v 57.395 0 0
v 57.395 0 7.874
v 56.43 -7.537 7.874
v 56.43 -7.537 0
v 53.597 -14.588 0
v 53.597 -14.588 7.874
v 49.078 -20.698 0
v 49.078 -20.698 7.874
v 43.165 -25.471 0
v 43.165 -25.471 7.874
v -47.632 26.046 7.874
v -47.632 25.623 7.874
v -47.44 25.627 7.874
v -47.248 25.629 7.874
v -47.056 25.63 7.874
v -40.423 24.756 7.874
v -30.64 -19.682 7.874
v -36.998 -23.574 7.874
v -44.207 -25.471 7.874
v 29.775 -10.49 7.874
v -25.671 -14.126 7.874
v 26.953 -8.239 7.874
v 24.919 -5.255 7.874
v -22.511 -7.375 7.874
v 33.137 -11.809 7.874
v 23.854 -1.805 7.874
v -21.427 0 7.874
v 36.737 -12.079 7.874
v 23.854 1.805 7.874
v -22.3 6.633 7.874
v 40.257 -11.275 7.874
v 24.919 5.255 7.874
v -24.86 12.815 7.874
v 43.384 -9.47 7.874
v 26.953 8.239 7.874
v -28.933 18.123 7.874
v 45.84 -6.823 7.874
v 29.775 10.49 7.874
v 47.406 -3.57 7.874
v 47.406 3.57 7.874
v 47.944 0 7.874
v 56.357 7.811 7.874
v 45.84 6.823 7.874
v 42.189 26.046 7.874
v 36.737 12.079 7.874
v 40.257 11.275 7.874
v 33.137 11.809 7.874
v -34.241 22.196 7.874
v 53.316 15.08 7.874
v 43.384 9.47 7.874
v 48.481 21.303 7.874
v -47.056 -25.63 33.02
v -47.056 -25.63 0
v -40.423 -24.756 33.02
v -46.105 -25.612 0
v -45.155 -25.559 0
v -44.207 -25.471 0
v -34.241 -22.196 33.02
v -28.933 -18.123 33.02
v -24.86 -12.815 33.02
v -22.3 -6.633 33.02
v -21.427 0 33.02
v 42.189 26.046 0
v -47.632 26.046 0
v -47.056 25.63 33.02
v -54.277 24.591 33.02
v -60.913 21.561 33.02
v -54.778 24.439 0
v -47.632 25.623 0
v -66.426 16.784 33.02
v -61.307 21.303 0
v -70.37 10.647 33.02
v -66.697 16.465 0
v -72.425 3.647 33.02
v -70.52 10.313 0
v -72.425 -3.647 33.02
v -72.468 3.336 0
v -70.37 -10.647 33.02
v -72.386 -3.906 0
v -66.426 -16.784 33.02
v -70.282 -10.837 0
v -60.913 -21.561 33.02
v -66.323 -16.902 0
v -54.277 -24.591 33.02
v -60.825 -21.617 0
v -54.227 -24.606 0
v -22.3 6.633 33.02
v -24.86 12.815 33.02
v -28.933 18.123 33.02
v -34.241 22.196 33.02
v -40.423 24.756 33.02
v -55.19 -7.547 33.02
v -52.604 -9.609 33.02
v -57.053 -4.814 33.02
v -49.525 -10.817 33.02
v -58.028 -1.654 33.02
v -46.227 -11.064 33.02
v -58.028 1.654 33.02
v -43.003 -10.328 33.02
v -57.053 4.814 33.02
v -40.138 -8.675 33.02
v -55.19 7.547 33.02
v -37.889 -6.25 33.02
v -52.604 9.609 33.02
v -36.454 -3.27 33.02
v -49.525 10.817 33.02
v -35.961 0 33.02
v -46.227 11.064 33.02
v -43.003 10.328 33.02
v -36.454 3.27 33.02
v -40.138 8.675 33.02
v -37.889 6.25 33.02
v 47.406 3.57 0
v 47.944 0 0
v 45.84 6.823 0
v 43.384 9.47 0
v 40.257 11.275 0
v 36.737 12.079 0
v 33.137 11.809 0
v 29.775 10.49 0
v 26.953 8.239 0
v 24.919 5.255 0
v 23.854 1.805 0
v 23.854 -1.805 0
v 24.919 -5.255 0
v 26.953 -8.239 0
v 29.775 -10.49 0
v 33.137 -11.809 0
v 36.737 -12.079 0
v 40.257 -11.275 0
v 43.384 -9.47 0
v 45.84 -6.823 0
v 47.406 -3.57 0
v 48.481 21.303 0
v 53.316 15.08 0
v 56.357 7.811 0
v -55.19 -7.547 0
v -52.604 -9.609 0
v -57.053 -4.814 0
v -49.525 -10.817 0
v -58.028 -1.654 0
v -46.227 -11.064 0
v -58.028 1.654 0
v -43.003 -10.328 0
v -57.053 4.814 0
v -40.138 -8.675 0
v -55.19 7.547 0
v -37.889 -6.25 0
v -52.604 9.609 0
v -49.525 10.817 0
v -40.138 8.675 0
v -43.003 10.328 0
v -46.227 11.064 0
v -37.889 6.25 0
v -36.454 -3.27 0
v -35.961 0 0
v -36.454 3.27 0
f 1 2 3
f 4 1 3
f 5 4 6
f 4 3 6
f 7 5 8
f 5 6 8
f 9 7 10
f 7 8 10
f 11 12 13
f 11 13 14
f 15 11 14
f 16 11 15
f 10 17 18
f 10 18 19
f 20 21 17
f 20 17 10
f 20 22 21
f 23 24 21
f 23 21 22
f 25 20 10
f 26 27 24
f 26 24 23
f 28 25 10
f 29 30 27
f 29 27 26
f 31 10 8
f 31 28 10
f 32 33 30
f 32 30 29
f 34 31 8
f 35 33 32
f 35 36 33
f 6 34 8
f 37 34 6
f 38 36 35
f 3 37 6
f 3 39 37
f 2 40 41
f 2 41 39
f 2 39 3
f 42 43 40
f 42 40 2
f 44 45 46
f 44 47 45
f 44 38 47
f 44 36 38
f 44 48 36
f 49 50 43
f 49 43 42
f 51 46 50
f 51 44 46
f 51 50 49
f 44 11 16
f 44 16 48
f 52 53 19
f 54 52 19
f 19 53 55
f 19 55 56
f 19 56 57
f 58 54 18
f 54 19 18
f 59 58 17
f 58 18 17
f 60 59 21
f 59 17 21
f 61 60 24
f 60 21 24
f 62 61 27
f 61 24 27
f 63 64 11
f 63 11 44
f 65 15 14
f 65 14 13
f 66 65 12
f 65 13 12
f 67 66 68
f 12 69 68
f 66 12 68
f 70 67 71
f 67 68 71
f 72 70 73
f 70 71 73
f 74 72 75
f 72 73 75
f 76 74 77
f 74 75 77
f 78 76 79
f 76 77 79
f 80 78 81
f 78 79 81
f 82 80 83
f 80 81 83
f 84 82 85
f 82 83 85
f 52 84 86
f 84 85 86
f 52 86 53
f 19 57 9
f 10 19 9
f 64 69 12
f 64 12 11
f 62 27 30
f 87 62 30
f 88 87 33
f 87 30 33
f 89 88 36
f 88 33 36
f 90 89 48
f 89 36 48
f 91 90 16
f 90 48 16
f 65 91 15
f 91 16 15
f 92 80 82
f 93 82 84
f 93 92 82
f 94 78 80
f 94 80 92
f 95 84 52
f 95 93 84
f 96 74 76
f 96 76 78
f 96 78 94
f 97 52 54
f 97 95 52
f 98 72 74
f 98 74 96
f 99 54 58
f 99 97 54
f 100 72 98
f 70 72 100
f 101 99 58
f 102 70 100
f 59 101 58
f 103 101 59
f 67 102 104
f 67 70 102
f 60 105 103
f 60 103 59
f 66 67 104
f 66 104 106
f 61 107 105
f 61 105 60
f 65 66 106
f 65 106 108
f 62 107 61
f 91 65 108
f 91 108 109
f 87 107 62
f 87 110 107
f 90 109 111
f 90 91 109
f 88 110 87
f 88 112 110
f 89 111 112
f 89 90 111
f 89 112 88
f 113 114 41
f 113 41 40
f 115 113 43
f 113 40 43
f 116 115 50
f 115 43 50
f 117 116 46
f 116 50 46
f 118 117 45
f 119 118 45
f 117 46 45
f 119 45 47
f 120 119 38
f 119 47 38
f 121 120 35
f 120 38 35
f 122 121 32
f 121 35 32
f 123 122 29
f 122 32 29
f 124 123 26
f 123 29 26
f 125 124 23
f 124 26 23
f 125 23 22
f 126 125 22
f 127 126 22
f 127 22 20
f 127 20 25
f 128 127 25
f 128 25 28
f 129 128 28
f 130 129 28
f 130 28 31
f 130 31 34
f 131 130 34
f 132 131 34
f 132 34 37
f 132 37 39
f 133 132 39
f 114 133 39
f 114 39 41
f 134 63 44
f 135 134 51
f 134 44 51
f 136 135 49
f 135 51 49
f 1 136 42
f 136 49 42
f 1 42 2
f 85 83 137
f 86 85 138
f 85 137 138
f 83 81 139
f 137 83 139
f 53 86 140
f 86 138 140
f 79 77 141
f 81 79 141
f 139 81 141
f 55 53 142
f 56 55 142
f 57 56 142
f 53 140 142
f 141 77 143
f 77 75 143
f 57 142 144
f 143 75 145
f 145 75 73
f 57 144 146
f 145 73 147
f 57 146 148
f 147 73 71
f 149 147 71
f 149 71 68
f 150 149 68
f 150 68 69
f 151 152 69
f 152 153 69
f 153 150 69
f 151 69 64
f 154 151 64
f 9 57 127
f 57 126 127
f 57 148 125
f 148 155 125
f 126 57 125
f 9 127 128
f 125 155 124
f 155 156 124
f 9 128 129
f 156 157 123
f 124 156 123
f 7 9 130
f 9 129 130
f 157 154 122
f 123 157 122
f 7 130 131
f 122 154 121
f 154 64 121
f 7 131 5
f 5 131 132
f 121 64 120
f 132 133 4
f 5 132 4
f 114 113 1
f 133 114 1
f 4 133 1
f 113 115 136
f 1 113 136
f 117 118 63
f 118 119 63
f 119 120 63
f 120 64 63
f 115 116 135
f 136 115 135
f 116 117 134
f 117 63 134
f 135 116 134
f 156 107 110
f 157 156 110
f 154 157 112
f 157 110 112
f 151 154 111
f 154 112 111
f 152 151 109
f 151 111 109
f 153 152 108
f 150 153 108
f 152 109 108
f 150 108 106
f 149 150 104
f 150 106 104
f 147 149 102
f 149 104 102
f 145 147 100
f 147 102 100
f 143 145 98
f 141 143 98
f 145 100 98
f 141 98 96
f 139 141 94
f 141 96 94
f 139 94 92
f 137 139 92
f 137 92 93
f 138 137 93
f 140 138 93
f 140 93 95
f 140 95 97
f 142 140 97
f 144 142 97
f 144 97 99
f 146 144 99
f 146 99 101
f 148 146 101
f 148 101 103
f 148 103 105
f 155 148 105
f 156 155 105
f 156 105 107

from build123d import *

# Parameters (mm, degrees)
F1_DEPTH = 33.02
F2_W     = 107.3515489697
F2_H     = 51.5172313899
F3_DEPTH = 7.874
F5_R     = 11.0954635734
F4_R     = 12.1126546704
F6_DEPTH = 81.534
F8_DEPTH = 25.4


with BuildPart() as f1:
    # F0 (on Top) → F1 (new body)
    with BuildSketch(Plane.XY):
        with BuildLine():
            ThreePointArc((-47.0562428236, -25.6296646715), (-28.9333331349, -18.1229096887), (-21.4265781521, 0))
            ThreePointArc((-21.4265781521, 0), (-28.9333331349, 18.1229096887), (-47.0562428236, 25.6296646715))
            ThreePointArc((-47.0562428236, 25.6296646715), (-72.6859074951, 0), (-47.0562428236, -25.6296646715))
        make_face()
    extrude(amount=F1_DEPTH)

    # F2 (on Top) → F3 (join)
    with BuildSketch(Plane.XY):
        with Locations((6.0439221561, 0.2878056839)):
            Rectangle(F2_W, F2_H)
    extrude(amount=F3_DEPTH)

    # F5 (on face) + F4 (on face) → F6 (cut)
    with BuildSketch(Plane.XY.offset(33.02)):
        with Locations((-47.0562428236, 0)):
            Circle(F5_R)
    with BuildSketch(Plane.XY.offset(7.874)):
        with Locations((35.8318202198, 0)):
            Circle(F4_R)
    extrude(amount=-F6_DEPTH, mode=Mode.SUBTRACT)

    # F7 (on face) → F8 (cut)
    with BuildSketch(Plane.XY.offset(7.874)):
        with BuildLine():
            ThreePointArc((42.1889192994, 26.0464213789), (53.3155577455, 15.0802409672), (57.3954509182, 0))
            ThreePointArc((57.3954509182, 0), (53.5965706877, -14.5882662321), (43.164924434, -25.470810011))
            Line((43.164924434, -25.470810011), (59.719696641, -25.470810011))
            Line((59.719696641, -25.470810011), (59.719696641, 26.0464213789))
            Line((59.719696641, 26.0464213789), (42.1889192994, 26.0464213789))
        make_face()
    extrude(amount=-F8_DEPTH, mode=Mode.SUBTRACT)


solid = f1.part
